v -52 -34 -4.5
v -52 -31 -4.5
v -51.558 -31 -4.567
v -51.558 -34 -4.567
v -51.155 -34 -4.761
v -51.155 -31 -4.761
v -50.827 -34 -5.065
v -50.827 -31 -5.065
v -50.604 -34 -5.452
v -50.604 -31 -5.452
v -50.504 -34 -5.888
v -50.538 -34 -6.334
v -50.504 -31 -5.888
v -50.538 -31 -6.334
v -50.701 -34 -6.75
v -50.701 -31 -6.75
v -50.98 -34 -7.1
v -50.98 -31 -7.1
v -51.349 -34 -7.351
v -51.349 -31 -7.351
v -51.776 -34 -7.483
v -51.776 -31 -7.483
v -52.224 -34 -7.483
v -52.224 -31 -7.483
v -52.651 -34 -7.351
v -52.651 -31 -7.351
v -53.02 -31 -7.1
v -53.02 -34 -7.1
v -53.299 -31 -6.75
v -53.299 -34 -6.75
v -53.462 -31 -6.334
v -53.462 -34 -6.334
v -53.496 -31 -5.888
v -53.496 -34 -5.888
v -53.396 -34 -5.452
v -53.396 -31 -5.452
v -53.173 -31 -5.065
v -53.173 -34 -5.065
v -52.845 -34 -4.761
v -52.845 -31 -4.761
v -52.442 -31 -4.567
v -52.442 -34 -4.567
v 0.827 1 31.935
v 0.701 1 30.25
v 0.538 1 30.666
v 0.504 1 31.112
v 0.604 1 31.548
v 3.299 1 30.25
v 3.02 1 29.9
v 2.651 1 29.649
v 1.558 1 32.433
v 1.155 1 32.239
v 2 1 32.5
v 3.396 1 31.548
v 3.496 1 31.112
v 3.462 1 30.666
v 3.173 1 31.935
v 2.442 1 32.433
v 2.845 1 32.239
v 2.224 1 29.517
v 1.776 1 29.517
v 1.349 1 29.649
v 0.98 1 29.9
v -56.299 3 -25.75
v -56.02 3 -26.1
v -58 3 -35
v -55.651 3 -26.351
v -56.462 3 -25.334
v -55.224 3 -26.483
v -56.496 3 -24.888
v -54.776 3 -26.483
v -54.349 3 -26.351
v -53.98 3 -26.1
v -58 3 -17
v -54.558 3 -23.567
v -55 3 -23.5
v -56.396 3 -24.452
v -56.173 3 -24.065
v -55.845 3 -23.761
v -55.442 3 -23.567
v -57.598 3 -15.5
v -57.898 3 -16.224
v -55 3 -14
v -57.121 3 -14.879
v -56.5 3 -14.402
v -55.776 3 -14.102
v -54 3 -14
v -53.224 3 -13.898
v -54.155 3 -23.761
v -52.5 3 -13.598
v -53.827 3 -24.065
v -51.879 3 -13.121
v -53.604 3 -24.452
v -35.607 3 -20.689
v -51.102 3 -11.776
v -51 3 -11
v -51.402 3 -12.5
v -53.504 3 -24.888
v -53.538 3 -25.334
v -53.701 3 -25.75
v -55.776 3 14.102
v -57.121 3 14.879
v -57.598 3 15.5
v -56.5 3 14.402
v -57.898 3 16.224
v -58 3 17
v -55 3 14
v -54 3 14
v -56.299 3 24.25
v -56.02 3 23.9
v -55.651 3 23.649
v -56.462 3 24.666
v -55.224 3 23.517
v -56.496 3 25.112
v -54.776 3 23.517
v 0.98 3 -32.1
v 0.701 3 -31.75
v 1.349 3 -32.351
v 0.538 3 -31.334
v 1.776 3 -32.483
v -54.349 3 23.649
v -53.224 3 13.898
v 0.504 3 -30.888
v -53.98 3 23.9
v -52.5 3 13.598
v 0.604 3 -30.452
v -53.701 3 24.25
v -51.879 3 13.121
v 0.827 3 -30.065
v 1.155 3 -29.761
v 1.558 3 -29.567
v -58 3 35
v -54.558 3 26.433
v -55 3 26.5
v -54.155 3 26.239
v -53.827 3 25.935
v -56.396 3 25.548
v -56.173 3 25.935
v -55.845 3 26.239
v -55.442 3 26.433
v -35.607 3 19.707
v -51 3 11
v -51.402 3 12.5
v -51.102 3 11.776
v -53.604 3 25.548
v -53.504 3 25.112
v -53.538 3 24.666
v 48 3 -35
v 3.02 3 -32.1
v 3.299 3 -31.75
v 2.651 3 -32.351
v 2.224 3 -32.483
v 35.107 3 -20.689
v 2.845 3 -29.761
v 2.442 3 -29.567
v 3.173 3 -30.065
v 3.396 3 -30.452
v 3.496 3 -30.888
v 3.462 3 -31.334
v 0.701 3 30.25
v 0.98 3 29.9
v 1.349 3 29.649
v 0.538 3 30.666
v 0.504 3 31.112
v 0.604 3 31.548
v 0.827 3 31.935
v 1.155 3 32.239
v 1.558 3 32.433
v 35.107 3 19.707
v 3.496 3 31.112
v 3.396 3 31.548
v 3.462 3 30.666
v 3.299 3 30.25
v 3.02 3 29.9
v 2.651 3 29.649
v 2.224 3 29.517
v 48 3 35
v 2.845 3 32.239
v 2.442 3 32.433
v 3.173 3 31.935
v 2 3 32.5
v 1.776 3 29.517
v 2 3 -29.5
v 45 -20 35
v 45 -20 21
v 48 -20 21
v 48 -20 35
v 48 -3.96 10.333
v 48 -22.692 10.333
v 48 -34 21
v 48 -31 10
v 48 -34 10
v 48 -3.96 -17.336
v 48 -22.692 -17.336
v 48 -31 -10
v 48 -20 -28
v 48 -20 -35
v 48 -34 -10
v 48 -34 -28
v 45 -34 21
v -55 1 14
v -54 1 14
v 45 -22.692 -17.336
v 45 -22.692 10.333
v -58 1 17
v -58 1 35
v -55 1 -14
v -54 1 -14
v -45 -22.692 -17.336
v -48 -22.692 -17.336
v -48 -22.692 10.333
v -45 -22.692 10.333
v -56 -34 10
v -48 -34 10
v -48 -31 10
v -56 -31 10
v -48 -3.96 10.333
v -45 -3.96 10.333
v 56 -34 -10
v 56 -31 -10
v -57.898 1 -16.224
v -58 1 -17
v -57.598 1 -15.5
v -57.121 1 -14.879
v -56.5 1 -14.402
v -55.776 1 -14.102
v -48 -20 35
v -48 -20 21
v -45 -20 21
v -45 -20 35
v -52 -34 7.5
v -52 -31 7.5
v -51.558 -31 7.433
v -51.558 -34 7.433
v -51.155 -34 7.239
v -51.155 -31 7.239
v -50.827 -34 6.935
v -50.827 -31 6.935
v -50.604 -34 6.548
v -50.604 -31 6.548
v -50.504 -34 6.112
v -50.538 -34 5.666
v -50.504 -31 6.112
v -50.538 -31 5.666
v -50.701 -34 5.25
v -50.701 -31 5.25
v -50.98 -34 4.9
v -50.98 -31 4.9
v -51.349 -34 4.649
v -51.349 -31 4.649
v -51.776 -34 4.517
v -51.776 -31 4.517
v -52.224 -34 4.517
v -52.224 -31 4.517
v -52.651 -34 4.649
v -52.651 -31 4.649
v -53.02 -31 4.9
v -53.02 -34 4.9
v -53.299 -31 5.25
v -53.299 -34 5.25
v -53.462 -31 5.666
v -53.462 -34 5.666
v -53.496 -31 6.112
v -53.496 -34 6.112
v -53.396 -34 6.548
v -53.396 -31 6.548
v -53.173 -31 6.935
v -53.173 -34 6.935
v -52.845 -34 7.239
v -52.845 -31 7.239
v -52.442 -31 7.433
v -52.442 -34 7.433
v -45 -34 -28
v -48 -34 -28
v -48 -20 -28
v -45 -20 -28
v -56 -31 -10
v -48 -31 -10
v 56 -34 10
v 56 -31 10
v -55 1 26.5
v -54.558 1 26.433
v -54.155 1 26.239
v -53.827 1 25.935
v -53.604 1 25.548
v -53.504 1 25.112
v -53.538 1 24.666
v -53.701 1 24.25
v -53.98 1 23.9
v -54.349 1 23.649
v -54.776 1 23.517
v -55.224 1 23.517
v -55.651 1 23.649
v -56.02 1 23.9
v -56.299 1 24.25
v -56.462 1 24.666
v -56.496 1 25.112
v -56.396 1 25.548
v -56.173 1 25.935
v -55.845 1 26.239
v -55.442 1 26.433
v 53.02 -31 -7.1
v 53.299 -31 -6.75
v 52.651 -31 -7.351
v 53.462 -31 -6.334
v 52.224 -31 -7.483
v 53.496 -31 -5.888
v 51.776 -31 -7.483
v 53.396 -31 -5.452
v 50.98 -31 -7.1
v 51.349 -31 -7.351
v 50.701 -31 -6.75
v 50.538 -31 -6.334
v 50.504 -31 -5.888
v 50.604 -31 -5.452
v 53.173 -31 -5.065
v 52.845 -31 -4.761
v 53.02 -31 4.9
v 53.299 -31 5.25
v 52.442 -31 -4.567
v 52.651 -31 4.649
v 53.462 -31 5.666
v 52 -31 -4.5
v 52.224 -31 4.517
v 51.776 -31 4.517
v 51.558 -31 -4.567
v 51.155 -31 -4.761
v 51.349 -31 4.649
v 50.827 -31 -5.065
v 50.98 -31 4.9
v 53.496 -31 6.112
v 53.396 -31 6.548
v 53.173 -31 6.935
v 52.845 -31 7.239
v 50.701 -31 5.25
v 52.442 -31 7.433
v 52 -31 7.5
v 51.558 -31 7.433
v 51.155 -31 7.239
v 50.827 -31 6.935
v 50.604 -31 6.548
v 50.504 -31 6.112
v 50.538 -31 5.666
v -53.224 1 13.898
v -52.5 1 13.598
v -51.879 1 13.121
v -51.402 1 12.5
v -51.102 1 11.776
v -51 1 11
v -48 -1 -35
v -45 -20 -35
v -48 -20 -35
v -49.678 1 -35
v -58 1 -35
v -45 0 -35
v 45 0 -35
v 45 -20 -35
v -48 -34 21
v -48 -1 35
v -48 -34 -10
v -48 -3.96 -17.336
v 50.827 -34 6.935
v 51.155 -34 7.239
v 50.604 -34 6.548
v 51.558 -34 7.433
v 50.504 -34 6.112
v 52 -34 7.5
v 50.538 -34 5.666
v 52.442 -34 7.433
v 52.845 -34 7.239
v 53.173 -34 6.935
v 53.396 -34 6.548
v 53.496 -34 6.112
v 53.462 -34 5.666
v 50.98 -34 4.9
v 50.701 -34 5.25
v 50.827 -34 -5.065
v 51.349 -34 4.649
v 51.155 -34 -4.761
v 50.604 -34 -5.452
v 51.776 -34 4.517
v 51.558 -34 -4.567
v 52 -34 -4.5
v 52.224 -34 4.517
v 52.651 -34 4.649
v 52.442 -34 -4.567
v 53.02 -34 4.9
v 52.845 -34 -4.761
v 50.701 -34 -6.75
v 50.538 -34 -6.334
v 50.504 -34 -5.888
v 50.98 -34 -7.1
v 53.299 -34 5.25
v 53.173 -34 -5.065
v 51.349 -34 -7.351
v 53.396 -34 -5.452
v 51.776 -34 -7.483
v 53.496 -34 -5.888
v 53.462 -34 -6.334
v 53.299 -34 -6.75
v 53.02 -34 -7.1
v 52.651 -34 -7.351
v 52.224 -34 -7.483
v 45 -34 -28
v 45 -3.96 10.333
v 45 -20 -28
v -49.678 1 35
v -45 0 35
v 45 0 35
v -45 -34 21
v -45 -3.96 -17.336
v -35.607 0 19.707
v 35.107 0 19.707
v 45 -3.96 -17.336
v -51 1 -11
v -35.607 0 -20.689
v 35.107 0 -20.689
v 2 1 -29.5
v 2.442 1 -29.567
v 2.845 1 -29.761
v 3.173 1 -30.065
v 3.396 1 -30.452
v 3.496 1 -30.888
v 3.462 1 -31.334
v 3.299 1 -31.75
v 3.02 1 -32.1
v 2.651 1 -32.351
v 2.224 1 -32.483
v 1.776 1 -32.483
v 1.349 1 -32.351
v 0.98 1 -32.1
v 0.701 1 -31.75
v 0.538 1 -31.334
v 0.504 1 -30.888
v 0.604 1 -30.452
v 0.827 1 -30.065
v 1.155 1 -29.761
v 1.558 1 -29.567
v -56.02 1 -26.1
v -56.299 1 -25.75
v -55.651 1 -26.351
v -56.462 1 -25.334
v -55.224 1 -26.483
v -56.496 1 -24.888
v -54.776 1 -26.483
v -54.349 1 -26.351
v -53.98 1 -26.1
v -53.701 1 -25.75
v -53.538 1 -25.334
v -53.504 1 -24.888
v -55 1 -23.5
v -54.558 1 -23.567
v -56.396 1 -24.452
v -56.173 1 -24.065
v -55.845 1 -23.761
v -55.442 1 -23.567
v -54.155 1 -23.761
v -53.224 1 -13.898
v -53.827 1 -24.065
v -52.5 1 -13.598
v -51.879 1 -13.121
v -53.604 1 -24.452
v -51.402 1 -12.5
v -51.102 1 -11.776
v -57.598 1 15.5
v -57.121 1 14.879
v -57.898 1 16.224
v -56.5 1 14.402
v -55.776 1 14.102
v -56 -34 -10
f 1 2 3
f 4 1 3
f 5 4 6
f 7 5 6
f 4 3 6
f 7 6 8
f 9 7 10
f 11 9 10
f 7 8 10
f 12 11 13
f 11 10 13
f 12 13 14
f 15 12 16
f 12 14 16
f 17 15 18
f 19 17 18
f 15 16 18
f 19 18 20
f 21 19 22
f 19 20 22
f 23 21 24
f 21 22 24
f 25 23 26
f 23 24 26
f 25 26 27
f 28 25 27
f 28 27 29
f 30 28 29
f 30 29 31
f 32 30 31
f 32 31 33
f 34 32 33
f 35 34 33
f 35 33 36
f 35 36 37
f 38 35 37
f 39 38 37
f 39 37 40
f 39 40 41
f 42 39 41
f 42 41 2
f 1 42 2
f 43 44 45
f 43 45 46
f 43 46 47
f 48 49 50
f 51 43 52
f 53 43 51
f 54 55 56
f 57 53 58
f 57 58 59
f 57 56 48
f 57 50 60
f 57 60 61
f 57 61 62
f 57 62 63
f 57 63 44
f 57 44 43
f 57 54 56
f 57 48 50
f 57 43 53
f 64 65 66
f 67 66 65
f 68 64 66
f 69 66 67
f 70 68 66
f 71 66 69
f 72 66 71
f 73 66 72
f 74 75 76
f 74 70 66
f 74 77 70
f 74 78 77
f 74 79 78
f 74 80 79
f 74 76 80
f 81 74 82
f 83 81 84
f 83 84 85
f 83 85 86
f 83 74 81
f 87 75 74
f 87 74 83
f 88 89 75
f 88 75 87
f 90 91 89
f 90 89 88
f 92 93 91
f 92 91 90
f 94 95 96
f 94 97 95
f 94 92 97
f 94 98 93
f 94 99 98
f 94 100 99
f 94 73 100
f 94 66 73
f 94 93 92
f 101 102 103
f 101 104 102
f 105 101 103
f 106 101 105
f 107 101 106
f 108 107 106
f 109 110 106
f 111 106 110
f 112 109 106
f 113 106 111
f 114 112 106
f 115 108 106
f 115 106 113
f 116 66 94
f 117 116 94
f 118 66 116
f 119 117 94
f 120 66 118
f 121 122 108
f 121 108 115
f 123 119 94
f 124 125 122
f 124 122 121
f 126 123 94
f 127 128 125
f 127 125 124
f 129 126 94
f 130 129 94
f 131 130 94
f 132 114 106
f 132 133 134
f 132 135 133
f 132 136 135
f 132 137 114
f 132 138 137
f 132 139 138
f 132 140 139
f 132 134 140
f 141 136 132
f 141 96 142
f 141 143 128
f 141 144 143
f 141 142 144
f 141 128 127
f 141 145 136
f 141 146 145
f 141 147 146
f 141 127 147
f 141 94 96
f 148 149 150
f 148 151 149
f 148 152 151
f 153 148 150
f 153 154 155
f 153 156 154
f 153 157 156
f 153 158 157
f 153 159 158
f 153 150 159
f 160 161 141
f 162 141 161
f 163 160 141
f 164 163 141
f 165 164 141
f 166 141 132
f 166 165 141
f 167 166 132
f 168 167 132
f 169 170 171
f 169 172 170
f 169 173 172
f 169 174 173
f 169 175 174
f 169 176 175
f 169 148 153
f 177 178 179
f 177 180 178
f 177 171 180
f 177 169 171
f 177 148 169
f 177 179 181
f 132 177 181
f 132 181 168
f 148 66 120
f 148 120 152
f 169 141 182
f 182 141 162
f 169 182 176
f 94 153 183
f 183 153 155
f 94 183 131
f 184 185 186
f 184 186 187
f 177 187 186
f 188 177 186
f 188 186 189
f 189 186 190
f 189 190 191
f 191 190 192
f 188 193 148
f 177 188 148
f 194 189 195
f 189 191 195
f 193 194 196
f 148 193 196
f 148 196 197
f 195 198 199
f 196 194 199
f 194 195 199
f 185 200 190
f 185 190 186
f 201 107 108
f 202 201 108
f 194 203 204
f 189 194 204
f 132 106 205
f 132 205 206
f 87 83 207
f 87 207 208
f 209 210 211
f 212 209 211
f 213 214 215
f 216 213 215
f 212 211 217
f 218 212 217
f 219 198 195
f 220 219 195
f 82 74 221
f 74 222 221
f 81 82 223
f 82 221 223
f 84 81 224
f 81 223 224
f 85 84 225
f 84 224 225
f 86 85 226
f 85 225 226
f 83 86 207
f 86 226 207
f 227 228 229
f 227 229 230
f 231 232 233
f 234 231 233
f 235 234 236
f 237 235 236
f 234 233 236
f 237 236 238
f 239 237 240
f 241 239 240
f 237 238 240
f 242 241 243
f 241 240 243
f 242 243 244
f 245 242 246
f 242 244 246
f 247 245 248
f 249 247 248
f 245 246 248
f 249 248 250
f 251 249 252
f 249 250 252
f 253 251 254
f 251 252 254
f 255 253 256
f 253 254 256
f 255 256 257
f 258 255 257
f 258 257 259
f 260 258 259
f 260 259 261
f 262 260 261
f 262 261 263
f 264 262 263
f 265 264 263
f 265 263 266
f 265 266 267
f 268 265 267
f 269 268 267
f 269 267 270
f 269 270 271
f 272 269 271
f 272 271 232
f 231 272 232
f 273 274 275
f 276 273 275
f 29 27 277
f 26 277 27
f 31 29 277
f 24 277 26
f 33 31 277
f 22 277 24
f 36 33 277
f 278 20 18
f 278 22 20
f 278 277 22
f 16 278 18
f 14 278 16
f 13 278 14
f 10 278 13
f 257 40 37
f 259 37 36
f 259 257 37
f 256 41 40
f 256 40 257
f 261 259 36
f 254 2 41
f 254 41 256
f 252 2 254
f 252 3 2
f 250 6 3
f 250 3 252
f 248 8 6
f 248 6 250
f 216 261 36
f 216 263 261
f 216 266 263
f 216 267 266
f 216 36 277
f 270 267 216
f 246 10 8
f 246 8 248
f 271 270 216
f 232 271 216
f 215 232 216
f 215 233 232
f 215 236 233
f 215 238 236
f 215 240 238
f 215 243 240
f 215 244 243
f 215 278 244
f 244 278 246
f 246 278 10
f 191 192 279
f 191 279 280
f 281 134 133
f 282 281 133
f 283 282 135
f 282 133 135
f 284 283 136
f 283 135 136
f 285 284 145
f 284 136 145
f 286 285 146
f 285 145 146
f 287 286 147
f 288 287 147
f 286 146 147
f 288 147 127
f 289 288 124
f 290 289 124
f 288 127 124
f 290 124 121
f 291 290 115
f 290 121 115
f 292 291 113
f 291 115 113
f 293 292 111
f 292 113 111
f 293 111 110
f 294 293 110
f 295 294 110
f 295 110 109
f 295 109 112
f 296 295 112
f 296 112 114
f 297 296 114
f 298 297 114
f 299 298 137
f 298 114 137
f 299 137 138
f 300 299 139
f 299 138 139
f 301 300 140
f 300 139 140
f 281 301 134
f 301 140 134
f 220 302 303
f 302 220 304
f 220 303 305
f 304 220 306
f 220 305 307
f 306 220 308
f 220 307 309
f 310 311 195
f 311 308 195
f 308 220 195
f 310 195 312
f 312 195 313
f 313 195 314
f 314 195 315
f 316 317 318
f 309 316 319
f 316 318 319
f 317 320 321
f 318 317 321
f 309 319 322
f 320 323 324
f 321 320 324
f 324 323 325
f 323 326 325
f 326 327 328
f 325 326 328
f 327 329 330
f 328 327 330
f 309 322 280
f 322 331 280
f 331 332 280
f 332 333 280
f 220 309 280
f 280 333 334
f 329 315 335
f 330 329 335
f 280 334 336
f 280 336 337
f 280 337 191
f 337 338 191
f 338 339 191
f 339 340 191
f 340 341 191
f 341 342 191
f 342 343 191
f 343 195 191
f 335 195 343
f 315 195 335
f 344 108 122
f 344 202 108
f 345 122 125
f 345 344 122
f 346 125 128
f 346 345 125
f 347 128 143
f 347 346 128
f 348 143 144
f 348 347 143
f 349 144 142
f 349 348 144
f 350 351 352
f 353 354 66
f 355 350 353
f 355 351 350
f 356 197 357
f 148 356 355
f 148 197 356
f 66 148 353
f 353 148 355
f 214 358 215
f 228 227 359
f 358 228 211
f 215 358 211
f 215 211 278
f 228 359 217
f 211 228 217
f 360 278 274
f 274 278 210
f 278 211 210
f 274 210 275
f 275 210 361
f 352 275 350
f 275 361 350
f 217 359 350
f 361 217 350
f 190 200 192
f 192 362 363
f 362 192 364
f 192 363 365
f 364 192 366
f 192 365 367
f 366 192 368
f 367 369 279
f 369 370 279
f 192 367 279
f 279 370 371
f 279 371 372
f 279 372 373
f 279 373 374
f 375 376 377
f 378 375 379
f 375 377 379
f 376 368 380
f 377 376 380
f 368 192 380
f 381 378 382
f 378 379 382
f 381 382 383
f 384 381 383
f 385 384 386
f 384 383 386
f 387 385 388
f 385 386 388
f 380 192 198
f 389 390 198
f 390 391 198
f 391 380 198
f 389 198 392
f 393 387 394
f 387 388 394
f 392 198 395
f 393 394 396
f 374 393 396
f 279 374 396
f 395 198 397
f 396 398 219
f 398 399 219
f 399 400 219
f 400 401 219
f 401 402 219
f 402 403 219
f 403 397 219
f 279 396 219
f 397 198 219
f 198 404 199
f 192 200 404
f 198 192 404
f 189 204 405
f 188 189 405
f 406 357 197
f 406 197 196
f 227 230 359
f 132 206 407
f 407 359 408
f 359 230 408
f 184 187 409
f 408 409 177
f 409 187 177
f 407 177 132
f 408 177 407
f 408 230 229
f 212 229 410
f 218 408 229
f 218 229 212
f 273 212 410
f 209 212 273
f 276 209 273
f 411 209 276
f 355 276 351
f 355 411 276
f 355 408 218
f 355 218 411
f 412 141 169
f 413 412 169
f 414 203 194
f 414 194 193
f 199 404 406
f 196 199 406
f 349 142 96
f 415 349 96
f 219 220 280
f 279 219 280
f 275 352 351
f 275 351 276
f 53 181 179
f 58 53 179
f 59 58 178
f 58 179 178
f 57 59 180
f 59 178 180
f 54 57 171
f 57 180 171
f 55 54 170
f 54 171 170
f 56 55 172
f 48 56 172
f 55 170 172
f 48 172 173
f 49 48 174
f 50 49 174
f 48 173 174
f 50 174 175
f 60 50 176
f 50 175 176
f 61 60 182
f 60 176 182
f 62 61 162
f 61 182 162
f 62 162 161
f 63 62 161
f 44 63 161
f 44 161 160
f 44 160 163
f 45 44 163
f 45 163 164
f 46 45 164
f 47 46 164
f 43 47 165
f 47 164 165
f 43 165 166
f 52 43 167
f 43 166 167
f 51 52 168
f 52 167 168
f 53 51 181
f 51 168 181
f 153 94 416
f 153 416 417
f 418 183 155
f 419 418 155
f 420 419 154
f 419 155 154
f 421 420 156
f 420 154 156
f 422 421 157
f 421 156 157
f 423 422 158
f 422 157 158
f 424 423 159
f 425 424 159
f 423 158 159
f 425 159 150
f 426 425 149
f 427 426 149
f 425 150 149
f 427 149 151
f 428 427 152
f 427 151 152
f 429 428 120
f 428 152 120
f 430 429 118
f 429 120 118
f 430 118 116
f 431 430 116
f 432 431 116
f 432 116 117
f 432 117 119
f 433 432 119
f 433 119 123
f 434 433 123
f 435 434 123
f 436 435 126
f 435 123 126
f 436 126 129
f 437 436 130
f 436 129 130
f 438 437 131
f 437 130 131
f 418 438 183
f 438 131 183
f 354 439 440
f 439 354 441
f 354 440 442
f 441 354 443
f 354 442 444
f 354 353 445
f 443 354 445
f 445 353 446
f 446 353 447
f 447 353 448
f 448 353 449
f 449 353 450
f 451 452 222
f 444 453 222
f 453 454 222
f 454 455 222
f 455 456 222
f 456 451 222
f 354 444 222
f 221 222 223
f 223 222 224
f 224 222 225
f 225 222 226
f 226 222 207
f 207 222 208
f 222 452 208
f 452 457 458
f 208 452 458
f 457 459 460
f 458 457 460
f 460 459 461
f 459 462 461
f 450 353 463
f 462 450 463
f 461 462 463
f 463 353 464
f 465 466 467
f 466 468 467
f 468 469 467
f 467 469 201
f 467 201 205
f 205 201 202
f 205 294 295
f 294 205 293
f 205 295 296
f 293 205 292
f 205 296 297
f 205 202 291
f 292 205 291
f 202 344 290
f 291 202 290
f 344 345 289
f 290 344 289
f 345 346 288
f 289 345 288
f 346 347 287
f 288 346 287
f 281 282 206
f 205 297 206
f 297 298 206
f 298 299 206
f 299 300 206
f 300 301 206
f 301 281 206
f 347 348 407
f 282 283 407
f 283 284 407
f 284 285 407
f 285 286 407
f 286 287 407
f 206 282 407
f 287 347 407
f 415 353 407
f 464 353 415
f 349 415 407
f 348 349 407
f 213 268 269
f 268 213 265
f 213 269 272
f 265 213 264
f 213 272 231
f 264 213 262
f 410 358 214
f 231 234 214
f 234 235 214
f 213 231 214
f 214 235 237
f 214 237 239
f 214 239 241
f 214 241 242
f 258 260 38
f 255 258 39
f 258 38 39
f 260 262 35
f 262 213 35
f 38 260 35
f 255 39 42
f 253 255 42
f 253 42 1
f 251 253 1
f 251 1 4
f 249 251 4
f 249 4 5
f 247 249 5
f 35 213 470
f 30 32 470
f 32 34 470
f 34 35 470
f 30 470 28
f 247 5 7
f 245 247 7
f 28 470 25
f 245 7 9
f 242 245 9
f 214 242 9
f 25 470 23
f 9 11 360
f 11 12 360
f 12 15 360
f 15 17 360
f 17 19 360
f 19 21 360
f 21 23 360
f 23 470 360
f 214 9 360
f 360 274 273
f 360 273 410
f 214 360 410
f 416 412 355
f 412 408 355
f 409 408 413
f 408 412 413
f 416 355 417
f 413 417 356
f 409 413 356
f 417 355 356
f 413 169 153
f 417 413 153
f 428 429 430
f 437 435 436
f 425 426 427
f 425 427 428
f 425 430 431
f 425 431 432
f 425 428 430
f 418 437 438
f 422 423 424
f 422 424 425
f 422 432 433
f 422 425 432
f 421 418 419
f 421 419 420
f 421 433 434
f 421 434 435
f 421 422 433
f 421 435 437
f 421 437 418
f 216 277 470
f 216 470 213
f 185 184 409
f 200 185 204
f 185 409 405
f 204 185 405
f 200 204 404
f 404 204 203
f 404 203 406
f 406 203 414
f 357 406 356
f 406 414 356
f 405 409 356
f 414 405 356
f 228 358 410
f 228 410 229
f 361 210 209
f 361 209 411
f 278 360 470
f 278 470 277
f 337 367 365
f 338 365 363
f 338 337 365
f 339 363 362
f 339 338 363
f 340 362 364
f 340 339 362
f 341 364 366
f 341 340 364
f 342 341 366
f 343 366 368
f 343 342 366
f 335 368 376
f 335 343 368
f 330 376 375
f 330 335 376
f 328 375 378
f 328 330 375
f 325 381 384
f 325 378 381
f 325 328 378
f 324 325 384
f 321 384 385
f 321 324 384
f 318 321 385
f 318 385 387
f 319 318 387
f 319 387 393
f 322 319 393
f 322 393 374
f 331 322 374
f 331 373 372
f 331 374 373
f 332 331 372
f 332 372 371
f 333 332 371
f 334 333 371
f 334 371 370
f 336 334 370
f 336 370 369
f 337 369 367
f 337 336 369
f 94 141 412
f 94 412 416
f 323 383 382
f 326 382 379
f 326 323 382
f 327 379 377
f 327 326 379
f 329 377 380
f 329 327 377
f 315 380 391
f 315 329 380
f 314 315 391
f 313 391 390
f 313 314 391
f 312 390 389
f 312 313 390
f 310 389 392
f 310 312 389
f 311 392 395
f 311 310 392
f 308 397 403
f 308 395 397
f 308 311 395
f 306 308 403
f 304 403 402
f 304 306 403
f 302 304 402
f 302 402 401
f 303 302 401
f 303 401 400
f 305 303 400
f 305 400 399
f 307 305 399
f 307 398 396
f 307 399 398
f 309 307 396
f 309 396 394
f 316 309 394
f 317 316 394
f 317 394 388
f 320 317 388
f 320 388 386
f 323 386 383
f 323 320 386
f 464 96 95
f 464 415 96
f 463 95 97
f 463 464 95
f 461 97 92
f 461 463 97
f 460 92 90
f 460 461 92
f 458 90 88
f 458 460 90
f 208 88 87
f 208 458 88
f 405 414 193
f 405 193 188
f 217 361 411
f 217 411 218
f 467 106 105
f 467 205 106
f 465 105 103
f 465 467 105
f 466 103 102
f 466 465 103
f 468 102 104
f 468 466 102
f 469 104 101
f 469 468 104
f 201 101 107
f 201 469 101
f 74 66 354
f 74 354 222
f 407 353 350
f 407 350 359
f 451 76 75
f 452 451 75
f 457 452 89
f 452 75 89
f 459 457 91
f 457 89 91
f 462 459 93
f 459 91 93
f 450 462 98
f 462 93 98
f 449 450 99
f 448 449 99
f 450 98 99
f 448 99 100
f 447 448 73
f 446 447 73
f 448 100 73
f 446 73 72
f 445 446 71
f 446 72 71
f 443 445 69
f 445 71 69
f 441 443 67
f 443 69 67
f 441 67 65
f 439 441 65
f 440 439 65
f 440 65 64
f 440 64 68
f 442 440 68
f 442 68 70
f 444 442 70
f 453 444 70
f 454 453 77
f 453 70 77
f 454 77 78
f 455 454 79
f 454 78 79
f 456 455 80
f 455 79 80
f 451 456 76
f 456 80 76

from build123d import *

# Parameters (mm, degrees)
SKETCH_1_W          = 3
SKETCH_1_H          = 70
SKETCH_1_W_2        = 90
EXTRUDE_1_DEPTH     = 3
SKETCH_1_3_W        = 3
SKETCH_1_3_H        = 70
EXTRUDE_2_DEPTH     = 34
SKETCH_2_W          = 20
SKETCH_2_H          = 3
EXTRUDE_3_DEPTH     = 8
SKETCH_3_R          = 1.5
CUT_EXTRUDE_1_DEPTH = 8
SKETCH_5_W          = 70
SKETCH_5_H          = 2
EXTRUDE_4_DEPTH     = 10
SKETCH_4_R          = 1.5
CUT_EXTRUDE_2_DEPTH = 2
SKETCH_6_W          = 7
SKETCH_6_H          = 28
CUT_EXTRUDE_3_DEPTH = 2
FILLET_1_R          = 3
SKETCH_7_W          = 14
SKETCH_7_H          = 14
SKETCH_7_W_2        = 7
CUT_EXTRUDE_4_DEPTH = 3
SKETCH_8_W          = 14
SKETCH_8_H          = 14
SKETCH_8_W_2        = 7
CUT_EXTRUDE_5_DEPTH = 3
SKETCH_9_W          = 70.71367567
SKETCH_9_H          = 40.396420294
CUT_EXTRUDE_6_DEPTH = 3
CUT_EXTRUDE_7_REACH = 116.878
SKETCH_10_W         = 27.669088334
SKETCH_10_H         = 18.732687127
CHAMFER_1_SIZE      = 2
CHAMFER_1_SIZE2     = 1.678199262


with BuildPart() as part:
    # 草图1 → 凸台-拉伸1 (new body)
    with BuildSketch(Plane(origin=(0, 0, 0), x_dir=(1, 0, 0), z_dir=(0, 1, 0))):
        with Locations((-46.5, 0)):
            Rectangle(SKETCH_1_W, SKETCH_1_H)
        Rectangle(SKETCH_1_W_2, SKETCH_1_H)
        with Locations((46.5, 0)):
            Rectangle(SKETCH_1_W, SKETCH_1_H)
    extrude(amount=EXTRUDE_1_DEPTH)

    # 草图1<3> → 凸台-拉伸2 (add)
    with BuildSketch(Plane(origin=(0, 0, 0), x_dir=(1, 0, 0), z_dir=(0, 1, 0))):
        with Locations((-46.5, 0)):
            Rectangle(SKETCH_1_3_W, SKETCH_1_3_H)
        with Locations((46.5, 0)):
            Rectangle(SKETCH_1_3_W, SKETCH_1_3_H)
    extrude(amount=-EXTRUDE_2_DEPTH)

    # 草图2 → 凸台-拉伸3 (add)
    with BuildSketch(Plane.ZY.offset(48)):
        with Locations((0, -32.5)):
            Rectangle(SKETCH_2_W, SKETCH_2_H)
    extrude_3 = extrude(amount=EXTRUDE_3_DEPTH)

    # 镜向1: 凸台-拉伸3 across plane
    add(extrude_3.mirror(Plane(origin=(0, 0, 0), x_dir=(0, 0, 1), z_dir=(1, 0, 0))))

    # 草图3 → 切除-拉伸1 (cut)
    with BuildSketch(Plane(origin=(0, -31, 0), x_dir=(1, 0, 0), z_dir=(0, 1, 0))):
        with Locations(Location((-52, 6, 0), (0, 0, 270))):
            Circle(SKETCH_3_R)
        with Locations(Location((-52, -6, 0), (0, 0, 270))):
            Circle(SKETCH_3_R)
    cut_extrude_1 = extrude(amount=-CUT_EXTRUDE_1_DEPTH, mode=Mode.SUBTRACT)

    # 镜向3: 切除-拉伸1 across plane
    add(cut_extrude_1.mirror(Plane(origin=(0, 0, 0), x_dir=(0, 0, 1), z_dir=(1, 0, 0))), mode=Mode.SUBTRACT)

    # 草图5 → 凸台-拉伸4 (add)
    with BuildSketch(Plane.ZY.offset(48)):
        with Locations((0, 2)):
            Rectangle(SKETCH_5_W, SKETCH_5_H)
    extrude(amount=EXTRUDE_4_DEPTH)

    # 草图4 → 切除-拉伸2 (cut)
    with BuildSketch(Plane(origin=(0, 3, 0), x_dir=(1, 0, 0), z_dir=(0, 1, 0))):
        with Locations(Location((-55, 25, 0), (0, 0, 270))):
            Circle(SKETCH_4_R)
        with Locations(Location((-55, -25, 0), (0, 0, 270))):
            Circle(SKETCH_4_R)
        with Locations(Location((2, 31, 0), (0, 0, 270))):
            Circle(SKETCH_4_R)
        with Locations(Location((2, -31, 0), (0, 0, 270))):
            Circle(SKETCH_4_R)
    extrude(amount=-CUT_EXTRUDE_2_DEPTH, mode=Mode.SUBTRACT)

    # 草图6 → 切除-拉伸3 (cut)
    with BuildSketch(Plane(origin=(0, 3, 0), x_dir=(1, 0, 0), z_dir=(0, 1, 0))):
        with Locations((-54.5, 0)):
            Rectangle(SKETCH_6_W, SKETCH_6_H)
    extrude(amount=-CUT_EXTRUDE_3_DEPTH, mode=Mode.SUBTRACT)

    # 圆角1
    fillet_1_edges = [part.edges().sort_by_distance(p)[0] for p in [
        (-58, 2, 14),
        (-58, 2, -14),
        (-51, 2, -14),
        (-51, 2, 14),
    ]]
    fillet(fillet_1_edges, radius=FILLET_1_R)

    # 草图7 → 切除-拉伸4 (cut)
    with BuildSketch(Plane.ZY.offset(-45)):
        with Locations((28, -27)):
            Rectangle(SKETCH_7_W, SKETCH_7_H)
        with Locations((-31.5, -27)):
            Rectangle(SKETCH_7_W_2, SKETCH_7_H)
    extrude(amount=-CUT_EXTRUDE_4_DEPTH, mode=Mode.SUBTRACT)

    # 草图8 → 切除-拉伸5 (cut)
    with BuildSketch(Plane.ZY.offset(48)):
        with Locations((28, -27)):
            Rectangle(SKETCH_8_W, SKETCH_8_H)
        with Locations((-31.5, -27)):
            Rectangle(SKETCH_8_W_2, SKETCH_8_H)
    extrude(amount=-CUT_EXTRUDE_5_DEPTH, mode=Mode.SUBTRACT)

    # 草图9 → 切除-拉伸6 (cut)
    with BuildSketch(Plane(origin=(0, 3, 0), x_dir=(1, 0, 0), z_dir=(0, 1, 0))):
        with Locations((-0.249939669, 0.491140899)):
            Rectangle(SKETCH_9_W, SKETCH_9_H)
    extrude(amount=-CUT_EXTRUDE_6_DEPTH, mode=Mode.SUBTRACT)

    # 切除-拉伸7: up to this face of the body (flat: up to its plane)
    cut_extrude_7_end = Plane(part.part.faces().sort_by_distance((48, -13.531753131, -1.073792487))[0])
    # 草图10 → 切除-拉伸7 (cut, up to the picked face)
    with BuildSketch(Plane.ZY.offset(48), mode=Mode.PRIVATE) as cut_extrude_7_sk1:
        with Locations((-3.501584346, -13.325871908)):
            Rectangle(SKETCH_10_W, SKETCH_10_H)
    cut_extrude_7_tool1 = split(extrude(cut_extrude_7_sk1.sketch, amount=-CUT_EXTRUDE_7_REACH, mode=Mode.PRIVATE), bisect_by=cut_extrude_7_end, keep=Keep.BOTH, mode=Mode.PRIVATE)
    add(cut_extrude_7_tool1.solids().sort_by(Axis((-48, -13.325872, -3.501584), (1, 0, 0)))[0], mode=Mode.SUBTRACT)

    # 倒角1
    chamfer_1_edges = [part.edges().sort_by_distance(p)[0] for p in [
        (-48, 1, 0),
    ]]
    chamfer_1_side = [part.faces().sort_by_distance(p)[0] for p in [
        (-48, -33.217376208, -19),
    ]]
    chamfer(chamfer_1_edges, length=CHAMFER_1_SIZE, length2=CHAMFER_1_SIZE2, reference=chamfer_1_side[0])


solid = part.part
